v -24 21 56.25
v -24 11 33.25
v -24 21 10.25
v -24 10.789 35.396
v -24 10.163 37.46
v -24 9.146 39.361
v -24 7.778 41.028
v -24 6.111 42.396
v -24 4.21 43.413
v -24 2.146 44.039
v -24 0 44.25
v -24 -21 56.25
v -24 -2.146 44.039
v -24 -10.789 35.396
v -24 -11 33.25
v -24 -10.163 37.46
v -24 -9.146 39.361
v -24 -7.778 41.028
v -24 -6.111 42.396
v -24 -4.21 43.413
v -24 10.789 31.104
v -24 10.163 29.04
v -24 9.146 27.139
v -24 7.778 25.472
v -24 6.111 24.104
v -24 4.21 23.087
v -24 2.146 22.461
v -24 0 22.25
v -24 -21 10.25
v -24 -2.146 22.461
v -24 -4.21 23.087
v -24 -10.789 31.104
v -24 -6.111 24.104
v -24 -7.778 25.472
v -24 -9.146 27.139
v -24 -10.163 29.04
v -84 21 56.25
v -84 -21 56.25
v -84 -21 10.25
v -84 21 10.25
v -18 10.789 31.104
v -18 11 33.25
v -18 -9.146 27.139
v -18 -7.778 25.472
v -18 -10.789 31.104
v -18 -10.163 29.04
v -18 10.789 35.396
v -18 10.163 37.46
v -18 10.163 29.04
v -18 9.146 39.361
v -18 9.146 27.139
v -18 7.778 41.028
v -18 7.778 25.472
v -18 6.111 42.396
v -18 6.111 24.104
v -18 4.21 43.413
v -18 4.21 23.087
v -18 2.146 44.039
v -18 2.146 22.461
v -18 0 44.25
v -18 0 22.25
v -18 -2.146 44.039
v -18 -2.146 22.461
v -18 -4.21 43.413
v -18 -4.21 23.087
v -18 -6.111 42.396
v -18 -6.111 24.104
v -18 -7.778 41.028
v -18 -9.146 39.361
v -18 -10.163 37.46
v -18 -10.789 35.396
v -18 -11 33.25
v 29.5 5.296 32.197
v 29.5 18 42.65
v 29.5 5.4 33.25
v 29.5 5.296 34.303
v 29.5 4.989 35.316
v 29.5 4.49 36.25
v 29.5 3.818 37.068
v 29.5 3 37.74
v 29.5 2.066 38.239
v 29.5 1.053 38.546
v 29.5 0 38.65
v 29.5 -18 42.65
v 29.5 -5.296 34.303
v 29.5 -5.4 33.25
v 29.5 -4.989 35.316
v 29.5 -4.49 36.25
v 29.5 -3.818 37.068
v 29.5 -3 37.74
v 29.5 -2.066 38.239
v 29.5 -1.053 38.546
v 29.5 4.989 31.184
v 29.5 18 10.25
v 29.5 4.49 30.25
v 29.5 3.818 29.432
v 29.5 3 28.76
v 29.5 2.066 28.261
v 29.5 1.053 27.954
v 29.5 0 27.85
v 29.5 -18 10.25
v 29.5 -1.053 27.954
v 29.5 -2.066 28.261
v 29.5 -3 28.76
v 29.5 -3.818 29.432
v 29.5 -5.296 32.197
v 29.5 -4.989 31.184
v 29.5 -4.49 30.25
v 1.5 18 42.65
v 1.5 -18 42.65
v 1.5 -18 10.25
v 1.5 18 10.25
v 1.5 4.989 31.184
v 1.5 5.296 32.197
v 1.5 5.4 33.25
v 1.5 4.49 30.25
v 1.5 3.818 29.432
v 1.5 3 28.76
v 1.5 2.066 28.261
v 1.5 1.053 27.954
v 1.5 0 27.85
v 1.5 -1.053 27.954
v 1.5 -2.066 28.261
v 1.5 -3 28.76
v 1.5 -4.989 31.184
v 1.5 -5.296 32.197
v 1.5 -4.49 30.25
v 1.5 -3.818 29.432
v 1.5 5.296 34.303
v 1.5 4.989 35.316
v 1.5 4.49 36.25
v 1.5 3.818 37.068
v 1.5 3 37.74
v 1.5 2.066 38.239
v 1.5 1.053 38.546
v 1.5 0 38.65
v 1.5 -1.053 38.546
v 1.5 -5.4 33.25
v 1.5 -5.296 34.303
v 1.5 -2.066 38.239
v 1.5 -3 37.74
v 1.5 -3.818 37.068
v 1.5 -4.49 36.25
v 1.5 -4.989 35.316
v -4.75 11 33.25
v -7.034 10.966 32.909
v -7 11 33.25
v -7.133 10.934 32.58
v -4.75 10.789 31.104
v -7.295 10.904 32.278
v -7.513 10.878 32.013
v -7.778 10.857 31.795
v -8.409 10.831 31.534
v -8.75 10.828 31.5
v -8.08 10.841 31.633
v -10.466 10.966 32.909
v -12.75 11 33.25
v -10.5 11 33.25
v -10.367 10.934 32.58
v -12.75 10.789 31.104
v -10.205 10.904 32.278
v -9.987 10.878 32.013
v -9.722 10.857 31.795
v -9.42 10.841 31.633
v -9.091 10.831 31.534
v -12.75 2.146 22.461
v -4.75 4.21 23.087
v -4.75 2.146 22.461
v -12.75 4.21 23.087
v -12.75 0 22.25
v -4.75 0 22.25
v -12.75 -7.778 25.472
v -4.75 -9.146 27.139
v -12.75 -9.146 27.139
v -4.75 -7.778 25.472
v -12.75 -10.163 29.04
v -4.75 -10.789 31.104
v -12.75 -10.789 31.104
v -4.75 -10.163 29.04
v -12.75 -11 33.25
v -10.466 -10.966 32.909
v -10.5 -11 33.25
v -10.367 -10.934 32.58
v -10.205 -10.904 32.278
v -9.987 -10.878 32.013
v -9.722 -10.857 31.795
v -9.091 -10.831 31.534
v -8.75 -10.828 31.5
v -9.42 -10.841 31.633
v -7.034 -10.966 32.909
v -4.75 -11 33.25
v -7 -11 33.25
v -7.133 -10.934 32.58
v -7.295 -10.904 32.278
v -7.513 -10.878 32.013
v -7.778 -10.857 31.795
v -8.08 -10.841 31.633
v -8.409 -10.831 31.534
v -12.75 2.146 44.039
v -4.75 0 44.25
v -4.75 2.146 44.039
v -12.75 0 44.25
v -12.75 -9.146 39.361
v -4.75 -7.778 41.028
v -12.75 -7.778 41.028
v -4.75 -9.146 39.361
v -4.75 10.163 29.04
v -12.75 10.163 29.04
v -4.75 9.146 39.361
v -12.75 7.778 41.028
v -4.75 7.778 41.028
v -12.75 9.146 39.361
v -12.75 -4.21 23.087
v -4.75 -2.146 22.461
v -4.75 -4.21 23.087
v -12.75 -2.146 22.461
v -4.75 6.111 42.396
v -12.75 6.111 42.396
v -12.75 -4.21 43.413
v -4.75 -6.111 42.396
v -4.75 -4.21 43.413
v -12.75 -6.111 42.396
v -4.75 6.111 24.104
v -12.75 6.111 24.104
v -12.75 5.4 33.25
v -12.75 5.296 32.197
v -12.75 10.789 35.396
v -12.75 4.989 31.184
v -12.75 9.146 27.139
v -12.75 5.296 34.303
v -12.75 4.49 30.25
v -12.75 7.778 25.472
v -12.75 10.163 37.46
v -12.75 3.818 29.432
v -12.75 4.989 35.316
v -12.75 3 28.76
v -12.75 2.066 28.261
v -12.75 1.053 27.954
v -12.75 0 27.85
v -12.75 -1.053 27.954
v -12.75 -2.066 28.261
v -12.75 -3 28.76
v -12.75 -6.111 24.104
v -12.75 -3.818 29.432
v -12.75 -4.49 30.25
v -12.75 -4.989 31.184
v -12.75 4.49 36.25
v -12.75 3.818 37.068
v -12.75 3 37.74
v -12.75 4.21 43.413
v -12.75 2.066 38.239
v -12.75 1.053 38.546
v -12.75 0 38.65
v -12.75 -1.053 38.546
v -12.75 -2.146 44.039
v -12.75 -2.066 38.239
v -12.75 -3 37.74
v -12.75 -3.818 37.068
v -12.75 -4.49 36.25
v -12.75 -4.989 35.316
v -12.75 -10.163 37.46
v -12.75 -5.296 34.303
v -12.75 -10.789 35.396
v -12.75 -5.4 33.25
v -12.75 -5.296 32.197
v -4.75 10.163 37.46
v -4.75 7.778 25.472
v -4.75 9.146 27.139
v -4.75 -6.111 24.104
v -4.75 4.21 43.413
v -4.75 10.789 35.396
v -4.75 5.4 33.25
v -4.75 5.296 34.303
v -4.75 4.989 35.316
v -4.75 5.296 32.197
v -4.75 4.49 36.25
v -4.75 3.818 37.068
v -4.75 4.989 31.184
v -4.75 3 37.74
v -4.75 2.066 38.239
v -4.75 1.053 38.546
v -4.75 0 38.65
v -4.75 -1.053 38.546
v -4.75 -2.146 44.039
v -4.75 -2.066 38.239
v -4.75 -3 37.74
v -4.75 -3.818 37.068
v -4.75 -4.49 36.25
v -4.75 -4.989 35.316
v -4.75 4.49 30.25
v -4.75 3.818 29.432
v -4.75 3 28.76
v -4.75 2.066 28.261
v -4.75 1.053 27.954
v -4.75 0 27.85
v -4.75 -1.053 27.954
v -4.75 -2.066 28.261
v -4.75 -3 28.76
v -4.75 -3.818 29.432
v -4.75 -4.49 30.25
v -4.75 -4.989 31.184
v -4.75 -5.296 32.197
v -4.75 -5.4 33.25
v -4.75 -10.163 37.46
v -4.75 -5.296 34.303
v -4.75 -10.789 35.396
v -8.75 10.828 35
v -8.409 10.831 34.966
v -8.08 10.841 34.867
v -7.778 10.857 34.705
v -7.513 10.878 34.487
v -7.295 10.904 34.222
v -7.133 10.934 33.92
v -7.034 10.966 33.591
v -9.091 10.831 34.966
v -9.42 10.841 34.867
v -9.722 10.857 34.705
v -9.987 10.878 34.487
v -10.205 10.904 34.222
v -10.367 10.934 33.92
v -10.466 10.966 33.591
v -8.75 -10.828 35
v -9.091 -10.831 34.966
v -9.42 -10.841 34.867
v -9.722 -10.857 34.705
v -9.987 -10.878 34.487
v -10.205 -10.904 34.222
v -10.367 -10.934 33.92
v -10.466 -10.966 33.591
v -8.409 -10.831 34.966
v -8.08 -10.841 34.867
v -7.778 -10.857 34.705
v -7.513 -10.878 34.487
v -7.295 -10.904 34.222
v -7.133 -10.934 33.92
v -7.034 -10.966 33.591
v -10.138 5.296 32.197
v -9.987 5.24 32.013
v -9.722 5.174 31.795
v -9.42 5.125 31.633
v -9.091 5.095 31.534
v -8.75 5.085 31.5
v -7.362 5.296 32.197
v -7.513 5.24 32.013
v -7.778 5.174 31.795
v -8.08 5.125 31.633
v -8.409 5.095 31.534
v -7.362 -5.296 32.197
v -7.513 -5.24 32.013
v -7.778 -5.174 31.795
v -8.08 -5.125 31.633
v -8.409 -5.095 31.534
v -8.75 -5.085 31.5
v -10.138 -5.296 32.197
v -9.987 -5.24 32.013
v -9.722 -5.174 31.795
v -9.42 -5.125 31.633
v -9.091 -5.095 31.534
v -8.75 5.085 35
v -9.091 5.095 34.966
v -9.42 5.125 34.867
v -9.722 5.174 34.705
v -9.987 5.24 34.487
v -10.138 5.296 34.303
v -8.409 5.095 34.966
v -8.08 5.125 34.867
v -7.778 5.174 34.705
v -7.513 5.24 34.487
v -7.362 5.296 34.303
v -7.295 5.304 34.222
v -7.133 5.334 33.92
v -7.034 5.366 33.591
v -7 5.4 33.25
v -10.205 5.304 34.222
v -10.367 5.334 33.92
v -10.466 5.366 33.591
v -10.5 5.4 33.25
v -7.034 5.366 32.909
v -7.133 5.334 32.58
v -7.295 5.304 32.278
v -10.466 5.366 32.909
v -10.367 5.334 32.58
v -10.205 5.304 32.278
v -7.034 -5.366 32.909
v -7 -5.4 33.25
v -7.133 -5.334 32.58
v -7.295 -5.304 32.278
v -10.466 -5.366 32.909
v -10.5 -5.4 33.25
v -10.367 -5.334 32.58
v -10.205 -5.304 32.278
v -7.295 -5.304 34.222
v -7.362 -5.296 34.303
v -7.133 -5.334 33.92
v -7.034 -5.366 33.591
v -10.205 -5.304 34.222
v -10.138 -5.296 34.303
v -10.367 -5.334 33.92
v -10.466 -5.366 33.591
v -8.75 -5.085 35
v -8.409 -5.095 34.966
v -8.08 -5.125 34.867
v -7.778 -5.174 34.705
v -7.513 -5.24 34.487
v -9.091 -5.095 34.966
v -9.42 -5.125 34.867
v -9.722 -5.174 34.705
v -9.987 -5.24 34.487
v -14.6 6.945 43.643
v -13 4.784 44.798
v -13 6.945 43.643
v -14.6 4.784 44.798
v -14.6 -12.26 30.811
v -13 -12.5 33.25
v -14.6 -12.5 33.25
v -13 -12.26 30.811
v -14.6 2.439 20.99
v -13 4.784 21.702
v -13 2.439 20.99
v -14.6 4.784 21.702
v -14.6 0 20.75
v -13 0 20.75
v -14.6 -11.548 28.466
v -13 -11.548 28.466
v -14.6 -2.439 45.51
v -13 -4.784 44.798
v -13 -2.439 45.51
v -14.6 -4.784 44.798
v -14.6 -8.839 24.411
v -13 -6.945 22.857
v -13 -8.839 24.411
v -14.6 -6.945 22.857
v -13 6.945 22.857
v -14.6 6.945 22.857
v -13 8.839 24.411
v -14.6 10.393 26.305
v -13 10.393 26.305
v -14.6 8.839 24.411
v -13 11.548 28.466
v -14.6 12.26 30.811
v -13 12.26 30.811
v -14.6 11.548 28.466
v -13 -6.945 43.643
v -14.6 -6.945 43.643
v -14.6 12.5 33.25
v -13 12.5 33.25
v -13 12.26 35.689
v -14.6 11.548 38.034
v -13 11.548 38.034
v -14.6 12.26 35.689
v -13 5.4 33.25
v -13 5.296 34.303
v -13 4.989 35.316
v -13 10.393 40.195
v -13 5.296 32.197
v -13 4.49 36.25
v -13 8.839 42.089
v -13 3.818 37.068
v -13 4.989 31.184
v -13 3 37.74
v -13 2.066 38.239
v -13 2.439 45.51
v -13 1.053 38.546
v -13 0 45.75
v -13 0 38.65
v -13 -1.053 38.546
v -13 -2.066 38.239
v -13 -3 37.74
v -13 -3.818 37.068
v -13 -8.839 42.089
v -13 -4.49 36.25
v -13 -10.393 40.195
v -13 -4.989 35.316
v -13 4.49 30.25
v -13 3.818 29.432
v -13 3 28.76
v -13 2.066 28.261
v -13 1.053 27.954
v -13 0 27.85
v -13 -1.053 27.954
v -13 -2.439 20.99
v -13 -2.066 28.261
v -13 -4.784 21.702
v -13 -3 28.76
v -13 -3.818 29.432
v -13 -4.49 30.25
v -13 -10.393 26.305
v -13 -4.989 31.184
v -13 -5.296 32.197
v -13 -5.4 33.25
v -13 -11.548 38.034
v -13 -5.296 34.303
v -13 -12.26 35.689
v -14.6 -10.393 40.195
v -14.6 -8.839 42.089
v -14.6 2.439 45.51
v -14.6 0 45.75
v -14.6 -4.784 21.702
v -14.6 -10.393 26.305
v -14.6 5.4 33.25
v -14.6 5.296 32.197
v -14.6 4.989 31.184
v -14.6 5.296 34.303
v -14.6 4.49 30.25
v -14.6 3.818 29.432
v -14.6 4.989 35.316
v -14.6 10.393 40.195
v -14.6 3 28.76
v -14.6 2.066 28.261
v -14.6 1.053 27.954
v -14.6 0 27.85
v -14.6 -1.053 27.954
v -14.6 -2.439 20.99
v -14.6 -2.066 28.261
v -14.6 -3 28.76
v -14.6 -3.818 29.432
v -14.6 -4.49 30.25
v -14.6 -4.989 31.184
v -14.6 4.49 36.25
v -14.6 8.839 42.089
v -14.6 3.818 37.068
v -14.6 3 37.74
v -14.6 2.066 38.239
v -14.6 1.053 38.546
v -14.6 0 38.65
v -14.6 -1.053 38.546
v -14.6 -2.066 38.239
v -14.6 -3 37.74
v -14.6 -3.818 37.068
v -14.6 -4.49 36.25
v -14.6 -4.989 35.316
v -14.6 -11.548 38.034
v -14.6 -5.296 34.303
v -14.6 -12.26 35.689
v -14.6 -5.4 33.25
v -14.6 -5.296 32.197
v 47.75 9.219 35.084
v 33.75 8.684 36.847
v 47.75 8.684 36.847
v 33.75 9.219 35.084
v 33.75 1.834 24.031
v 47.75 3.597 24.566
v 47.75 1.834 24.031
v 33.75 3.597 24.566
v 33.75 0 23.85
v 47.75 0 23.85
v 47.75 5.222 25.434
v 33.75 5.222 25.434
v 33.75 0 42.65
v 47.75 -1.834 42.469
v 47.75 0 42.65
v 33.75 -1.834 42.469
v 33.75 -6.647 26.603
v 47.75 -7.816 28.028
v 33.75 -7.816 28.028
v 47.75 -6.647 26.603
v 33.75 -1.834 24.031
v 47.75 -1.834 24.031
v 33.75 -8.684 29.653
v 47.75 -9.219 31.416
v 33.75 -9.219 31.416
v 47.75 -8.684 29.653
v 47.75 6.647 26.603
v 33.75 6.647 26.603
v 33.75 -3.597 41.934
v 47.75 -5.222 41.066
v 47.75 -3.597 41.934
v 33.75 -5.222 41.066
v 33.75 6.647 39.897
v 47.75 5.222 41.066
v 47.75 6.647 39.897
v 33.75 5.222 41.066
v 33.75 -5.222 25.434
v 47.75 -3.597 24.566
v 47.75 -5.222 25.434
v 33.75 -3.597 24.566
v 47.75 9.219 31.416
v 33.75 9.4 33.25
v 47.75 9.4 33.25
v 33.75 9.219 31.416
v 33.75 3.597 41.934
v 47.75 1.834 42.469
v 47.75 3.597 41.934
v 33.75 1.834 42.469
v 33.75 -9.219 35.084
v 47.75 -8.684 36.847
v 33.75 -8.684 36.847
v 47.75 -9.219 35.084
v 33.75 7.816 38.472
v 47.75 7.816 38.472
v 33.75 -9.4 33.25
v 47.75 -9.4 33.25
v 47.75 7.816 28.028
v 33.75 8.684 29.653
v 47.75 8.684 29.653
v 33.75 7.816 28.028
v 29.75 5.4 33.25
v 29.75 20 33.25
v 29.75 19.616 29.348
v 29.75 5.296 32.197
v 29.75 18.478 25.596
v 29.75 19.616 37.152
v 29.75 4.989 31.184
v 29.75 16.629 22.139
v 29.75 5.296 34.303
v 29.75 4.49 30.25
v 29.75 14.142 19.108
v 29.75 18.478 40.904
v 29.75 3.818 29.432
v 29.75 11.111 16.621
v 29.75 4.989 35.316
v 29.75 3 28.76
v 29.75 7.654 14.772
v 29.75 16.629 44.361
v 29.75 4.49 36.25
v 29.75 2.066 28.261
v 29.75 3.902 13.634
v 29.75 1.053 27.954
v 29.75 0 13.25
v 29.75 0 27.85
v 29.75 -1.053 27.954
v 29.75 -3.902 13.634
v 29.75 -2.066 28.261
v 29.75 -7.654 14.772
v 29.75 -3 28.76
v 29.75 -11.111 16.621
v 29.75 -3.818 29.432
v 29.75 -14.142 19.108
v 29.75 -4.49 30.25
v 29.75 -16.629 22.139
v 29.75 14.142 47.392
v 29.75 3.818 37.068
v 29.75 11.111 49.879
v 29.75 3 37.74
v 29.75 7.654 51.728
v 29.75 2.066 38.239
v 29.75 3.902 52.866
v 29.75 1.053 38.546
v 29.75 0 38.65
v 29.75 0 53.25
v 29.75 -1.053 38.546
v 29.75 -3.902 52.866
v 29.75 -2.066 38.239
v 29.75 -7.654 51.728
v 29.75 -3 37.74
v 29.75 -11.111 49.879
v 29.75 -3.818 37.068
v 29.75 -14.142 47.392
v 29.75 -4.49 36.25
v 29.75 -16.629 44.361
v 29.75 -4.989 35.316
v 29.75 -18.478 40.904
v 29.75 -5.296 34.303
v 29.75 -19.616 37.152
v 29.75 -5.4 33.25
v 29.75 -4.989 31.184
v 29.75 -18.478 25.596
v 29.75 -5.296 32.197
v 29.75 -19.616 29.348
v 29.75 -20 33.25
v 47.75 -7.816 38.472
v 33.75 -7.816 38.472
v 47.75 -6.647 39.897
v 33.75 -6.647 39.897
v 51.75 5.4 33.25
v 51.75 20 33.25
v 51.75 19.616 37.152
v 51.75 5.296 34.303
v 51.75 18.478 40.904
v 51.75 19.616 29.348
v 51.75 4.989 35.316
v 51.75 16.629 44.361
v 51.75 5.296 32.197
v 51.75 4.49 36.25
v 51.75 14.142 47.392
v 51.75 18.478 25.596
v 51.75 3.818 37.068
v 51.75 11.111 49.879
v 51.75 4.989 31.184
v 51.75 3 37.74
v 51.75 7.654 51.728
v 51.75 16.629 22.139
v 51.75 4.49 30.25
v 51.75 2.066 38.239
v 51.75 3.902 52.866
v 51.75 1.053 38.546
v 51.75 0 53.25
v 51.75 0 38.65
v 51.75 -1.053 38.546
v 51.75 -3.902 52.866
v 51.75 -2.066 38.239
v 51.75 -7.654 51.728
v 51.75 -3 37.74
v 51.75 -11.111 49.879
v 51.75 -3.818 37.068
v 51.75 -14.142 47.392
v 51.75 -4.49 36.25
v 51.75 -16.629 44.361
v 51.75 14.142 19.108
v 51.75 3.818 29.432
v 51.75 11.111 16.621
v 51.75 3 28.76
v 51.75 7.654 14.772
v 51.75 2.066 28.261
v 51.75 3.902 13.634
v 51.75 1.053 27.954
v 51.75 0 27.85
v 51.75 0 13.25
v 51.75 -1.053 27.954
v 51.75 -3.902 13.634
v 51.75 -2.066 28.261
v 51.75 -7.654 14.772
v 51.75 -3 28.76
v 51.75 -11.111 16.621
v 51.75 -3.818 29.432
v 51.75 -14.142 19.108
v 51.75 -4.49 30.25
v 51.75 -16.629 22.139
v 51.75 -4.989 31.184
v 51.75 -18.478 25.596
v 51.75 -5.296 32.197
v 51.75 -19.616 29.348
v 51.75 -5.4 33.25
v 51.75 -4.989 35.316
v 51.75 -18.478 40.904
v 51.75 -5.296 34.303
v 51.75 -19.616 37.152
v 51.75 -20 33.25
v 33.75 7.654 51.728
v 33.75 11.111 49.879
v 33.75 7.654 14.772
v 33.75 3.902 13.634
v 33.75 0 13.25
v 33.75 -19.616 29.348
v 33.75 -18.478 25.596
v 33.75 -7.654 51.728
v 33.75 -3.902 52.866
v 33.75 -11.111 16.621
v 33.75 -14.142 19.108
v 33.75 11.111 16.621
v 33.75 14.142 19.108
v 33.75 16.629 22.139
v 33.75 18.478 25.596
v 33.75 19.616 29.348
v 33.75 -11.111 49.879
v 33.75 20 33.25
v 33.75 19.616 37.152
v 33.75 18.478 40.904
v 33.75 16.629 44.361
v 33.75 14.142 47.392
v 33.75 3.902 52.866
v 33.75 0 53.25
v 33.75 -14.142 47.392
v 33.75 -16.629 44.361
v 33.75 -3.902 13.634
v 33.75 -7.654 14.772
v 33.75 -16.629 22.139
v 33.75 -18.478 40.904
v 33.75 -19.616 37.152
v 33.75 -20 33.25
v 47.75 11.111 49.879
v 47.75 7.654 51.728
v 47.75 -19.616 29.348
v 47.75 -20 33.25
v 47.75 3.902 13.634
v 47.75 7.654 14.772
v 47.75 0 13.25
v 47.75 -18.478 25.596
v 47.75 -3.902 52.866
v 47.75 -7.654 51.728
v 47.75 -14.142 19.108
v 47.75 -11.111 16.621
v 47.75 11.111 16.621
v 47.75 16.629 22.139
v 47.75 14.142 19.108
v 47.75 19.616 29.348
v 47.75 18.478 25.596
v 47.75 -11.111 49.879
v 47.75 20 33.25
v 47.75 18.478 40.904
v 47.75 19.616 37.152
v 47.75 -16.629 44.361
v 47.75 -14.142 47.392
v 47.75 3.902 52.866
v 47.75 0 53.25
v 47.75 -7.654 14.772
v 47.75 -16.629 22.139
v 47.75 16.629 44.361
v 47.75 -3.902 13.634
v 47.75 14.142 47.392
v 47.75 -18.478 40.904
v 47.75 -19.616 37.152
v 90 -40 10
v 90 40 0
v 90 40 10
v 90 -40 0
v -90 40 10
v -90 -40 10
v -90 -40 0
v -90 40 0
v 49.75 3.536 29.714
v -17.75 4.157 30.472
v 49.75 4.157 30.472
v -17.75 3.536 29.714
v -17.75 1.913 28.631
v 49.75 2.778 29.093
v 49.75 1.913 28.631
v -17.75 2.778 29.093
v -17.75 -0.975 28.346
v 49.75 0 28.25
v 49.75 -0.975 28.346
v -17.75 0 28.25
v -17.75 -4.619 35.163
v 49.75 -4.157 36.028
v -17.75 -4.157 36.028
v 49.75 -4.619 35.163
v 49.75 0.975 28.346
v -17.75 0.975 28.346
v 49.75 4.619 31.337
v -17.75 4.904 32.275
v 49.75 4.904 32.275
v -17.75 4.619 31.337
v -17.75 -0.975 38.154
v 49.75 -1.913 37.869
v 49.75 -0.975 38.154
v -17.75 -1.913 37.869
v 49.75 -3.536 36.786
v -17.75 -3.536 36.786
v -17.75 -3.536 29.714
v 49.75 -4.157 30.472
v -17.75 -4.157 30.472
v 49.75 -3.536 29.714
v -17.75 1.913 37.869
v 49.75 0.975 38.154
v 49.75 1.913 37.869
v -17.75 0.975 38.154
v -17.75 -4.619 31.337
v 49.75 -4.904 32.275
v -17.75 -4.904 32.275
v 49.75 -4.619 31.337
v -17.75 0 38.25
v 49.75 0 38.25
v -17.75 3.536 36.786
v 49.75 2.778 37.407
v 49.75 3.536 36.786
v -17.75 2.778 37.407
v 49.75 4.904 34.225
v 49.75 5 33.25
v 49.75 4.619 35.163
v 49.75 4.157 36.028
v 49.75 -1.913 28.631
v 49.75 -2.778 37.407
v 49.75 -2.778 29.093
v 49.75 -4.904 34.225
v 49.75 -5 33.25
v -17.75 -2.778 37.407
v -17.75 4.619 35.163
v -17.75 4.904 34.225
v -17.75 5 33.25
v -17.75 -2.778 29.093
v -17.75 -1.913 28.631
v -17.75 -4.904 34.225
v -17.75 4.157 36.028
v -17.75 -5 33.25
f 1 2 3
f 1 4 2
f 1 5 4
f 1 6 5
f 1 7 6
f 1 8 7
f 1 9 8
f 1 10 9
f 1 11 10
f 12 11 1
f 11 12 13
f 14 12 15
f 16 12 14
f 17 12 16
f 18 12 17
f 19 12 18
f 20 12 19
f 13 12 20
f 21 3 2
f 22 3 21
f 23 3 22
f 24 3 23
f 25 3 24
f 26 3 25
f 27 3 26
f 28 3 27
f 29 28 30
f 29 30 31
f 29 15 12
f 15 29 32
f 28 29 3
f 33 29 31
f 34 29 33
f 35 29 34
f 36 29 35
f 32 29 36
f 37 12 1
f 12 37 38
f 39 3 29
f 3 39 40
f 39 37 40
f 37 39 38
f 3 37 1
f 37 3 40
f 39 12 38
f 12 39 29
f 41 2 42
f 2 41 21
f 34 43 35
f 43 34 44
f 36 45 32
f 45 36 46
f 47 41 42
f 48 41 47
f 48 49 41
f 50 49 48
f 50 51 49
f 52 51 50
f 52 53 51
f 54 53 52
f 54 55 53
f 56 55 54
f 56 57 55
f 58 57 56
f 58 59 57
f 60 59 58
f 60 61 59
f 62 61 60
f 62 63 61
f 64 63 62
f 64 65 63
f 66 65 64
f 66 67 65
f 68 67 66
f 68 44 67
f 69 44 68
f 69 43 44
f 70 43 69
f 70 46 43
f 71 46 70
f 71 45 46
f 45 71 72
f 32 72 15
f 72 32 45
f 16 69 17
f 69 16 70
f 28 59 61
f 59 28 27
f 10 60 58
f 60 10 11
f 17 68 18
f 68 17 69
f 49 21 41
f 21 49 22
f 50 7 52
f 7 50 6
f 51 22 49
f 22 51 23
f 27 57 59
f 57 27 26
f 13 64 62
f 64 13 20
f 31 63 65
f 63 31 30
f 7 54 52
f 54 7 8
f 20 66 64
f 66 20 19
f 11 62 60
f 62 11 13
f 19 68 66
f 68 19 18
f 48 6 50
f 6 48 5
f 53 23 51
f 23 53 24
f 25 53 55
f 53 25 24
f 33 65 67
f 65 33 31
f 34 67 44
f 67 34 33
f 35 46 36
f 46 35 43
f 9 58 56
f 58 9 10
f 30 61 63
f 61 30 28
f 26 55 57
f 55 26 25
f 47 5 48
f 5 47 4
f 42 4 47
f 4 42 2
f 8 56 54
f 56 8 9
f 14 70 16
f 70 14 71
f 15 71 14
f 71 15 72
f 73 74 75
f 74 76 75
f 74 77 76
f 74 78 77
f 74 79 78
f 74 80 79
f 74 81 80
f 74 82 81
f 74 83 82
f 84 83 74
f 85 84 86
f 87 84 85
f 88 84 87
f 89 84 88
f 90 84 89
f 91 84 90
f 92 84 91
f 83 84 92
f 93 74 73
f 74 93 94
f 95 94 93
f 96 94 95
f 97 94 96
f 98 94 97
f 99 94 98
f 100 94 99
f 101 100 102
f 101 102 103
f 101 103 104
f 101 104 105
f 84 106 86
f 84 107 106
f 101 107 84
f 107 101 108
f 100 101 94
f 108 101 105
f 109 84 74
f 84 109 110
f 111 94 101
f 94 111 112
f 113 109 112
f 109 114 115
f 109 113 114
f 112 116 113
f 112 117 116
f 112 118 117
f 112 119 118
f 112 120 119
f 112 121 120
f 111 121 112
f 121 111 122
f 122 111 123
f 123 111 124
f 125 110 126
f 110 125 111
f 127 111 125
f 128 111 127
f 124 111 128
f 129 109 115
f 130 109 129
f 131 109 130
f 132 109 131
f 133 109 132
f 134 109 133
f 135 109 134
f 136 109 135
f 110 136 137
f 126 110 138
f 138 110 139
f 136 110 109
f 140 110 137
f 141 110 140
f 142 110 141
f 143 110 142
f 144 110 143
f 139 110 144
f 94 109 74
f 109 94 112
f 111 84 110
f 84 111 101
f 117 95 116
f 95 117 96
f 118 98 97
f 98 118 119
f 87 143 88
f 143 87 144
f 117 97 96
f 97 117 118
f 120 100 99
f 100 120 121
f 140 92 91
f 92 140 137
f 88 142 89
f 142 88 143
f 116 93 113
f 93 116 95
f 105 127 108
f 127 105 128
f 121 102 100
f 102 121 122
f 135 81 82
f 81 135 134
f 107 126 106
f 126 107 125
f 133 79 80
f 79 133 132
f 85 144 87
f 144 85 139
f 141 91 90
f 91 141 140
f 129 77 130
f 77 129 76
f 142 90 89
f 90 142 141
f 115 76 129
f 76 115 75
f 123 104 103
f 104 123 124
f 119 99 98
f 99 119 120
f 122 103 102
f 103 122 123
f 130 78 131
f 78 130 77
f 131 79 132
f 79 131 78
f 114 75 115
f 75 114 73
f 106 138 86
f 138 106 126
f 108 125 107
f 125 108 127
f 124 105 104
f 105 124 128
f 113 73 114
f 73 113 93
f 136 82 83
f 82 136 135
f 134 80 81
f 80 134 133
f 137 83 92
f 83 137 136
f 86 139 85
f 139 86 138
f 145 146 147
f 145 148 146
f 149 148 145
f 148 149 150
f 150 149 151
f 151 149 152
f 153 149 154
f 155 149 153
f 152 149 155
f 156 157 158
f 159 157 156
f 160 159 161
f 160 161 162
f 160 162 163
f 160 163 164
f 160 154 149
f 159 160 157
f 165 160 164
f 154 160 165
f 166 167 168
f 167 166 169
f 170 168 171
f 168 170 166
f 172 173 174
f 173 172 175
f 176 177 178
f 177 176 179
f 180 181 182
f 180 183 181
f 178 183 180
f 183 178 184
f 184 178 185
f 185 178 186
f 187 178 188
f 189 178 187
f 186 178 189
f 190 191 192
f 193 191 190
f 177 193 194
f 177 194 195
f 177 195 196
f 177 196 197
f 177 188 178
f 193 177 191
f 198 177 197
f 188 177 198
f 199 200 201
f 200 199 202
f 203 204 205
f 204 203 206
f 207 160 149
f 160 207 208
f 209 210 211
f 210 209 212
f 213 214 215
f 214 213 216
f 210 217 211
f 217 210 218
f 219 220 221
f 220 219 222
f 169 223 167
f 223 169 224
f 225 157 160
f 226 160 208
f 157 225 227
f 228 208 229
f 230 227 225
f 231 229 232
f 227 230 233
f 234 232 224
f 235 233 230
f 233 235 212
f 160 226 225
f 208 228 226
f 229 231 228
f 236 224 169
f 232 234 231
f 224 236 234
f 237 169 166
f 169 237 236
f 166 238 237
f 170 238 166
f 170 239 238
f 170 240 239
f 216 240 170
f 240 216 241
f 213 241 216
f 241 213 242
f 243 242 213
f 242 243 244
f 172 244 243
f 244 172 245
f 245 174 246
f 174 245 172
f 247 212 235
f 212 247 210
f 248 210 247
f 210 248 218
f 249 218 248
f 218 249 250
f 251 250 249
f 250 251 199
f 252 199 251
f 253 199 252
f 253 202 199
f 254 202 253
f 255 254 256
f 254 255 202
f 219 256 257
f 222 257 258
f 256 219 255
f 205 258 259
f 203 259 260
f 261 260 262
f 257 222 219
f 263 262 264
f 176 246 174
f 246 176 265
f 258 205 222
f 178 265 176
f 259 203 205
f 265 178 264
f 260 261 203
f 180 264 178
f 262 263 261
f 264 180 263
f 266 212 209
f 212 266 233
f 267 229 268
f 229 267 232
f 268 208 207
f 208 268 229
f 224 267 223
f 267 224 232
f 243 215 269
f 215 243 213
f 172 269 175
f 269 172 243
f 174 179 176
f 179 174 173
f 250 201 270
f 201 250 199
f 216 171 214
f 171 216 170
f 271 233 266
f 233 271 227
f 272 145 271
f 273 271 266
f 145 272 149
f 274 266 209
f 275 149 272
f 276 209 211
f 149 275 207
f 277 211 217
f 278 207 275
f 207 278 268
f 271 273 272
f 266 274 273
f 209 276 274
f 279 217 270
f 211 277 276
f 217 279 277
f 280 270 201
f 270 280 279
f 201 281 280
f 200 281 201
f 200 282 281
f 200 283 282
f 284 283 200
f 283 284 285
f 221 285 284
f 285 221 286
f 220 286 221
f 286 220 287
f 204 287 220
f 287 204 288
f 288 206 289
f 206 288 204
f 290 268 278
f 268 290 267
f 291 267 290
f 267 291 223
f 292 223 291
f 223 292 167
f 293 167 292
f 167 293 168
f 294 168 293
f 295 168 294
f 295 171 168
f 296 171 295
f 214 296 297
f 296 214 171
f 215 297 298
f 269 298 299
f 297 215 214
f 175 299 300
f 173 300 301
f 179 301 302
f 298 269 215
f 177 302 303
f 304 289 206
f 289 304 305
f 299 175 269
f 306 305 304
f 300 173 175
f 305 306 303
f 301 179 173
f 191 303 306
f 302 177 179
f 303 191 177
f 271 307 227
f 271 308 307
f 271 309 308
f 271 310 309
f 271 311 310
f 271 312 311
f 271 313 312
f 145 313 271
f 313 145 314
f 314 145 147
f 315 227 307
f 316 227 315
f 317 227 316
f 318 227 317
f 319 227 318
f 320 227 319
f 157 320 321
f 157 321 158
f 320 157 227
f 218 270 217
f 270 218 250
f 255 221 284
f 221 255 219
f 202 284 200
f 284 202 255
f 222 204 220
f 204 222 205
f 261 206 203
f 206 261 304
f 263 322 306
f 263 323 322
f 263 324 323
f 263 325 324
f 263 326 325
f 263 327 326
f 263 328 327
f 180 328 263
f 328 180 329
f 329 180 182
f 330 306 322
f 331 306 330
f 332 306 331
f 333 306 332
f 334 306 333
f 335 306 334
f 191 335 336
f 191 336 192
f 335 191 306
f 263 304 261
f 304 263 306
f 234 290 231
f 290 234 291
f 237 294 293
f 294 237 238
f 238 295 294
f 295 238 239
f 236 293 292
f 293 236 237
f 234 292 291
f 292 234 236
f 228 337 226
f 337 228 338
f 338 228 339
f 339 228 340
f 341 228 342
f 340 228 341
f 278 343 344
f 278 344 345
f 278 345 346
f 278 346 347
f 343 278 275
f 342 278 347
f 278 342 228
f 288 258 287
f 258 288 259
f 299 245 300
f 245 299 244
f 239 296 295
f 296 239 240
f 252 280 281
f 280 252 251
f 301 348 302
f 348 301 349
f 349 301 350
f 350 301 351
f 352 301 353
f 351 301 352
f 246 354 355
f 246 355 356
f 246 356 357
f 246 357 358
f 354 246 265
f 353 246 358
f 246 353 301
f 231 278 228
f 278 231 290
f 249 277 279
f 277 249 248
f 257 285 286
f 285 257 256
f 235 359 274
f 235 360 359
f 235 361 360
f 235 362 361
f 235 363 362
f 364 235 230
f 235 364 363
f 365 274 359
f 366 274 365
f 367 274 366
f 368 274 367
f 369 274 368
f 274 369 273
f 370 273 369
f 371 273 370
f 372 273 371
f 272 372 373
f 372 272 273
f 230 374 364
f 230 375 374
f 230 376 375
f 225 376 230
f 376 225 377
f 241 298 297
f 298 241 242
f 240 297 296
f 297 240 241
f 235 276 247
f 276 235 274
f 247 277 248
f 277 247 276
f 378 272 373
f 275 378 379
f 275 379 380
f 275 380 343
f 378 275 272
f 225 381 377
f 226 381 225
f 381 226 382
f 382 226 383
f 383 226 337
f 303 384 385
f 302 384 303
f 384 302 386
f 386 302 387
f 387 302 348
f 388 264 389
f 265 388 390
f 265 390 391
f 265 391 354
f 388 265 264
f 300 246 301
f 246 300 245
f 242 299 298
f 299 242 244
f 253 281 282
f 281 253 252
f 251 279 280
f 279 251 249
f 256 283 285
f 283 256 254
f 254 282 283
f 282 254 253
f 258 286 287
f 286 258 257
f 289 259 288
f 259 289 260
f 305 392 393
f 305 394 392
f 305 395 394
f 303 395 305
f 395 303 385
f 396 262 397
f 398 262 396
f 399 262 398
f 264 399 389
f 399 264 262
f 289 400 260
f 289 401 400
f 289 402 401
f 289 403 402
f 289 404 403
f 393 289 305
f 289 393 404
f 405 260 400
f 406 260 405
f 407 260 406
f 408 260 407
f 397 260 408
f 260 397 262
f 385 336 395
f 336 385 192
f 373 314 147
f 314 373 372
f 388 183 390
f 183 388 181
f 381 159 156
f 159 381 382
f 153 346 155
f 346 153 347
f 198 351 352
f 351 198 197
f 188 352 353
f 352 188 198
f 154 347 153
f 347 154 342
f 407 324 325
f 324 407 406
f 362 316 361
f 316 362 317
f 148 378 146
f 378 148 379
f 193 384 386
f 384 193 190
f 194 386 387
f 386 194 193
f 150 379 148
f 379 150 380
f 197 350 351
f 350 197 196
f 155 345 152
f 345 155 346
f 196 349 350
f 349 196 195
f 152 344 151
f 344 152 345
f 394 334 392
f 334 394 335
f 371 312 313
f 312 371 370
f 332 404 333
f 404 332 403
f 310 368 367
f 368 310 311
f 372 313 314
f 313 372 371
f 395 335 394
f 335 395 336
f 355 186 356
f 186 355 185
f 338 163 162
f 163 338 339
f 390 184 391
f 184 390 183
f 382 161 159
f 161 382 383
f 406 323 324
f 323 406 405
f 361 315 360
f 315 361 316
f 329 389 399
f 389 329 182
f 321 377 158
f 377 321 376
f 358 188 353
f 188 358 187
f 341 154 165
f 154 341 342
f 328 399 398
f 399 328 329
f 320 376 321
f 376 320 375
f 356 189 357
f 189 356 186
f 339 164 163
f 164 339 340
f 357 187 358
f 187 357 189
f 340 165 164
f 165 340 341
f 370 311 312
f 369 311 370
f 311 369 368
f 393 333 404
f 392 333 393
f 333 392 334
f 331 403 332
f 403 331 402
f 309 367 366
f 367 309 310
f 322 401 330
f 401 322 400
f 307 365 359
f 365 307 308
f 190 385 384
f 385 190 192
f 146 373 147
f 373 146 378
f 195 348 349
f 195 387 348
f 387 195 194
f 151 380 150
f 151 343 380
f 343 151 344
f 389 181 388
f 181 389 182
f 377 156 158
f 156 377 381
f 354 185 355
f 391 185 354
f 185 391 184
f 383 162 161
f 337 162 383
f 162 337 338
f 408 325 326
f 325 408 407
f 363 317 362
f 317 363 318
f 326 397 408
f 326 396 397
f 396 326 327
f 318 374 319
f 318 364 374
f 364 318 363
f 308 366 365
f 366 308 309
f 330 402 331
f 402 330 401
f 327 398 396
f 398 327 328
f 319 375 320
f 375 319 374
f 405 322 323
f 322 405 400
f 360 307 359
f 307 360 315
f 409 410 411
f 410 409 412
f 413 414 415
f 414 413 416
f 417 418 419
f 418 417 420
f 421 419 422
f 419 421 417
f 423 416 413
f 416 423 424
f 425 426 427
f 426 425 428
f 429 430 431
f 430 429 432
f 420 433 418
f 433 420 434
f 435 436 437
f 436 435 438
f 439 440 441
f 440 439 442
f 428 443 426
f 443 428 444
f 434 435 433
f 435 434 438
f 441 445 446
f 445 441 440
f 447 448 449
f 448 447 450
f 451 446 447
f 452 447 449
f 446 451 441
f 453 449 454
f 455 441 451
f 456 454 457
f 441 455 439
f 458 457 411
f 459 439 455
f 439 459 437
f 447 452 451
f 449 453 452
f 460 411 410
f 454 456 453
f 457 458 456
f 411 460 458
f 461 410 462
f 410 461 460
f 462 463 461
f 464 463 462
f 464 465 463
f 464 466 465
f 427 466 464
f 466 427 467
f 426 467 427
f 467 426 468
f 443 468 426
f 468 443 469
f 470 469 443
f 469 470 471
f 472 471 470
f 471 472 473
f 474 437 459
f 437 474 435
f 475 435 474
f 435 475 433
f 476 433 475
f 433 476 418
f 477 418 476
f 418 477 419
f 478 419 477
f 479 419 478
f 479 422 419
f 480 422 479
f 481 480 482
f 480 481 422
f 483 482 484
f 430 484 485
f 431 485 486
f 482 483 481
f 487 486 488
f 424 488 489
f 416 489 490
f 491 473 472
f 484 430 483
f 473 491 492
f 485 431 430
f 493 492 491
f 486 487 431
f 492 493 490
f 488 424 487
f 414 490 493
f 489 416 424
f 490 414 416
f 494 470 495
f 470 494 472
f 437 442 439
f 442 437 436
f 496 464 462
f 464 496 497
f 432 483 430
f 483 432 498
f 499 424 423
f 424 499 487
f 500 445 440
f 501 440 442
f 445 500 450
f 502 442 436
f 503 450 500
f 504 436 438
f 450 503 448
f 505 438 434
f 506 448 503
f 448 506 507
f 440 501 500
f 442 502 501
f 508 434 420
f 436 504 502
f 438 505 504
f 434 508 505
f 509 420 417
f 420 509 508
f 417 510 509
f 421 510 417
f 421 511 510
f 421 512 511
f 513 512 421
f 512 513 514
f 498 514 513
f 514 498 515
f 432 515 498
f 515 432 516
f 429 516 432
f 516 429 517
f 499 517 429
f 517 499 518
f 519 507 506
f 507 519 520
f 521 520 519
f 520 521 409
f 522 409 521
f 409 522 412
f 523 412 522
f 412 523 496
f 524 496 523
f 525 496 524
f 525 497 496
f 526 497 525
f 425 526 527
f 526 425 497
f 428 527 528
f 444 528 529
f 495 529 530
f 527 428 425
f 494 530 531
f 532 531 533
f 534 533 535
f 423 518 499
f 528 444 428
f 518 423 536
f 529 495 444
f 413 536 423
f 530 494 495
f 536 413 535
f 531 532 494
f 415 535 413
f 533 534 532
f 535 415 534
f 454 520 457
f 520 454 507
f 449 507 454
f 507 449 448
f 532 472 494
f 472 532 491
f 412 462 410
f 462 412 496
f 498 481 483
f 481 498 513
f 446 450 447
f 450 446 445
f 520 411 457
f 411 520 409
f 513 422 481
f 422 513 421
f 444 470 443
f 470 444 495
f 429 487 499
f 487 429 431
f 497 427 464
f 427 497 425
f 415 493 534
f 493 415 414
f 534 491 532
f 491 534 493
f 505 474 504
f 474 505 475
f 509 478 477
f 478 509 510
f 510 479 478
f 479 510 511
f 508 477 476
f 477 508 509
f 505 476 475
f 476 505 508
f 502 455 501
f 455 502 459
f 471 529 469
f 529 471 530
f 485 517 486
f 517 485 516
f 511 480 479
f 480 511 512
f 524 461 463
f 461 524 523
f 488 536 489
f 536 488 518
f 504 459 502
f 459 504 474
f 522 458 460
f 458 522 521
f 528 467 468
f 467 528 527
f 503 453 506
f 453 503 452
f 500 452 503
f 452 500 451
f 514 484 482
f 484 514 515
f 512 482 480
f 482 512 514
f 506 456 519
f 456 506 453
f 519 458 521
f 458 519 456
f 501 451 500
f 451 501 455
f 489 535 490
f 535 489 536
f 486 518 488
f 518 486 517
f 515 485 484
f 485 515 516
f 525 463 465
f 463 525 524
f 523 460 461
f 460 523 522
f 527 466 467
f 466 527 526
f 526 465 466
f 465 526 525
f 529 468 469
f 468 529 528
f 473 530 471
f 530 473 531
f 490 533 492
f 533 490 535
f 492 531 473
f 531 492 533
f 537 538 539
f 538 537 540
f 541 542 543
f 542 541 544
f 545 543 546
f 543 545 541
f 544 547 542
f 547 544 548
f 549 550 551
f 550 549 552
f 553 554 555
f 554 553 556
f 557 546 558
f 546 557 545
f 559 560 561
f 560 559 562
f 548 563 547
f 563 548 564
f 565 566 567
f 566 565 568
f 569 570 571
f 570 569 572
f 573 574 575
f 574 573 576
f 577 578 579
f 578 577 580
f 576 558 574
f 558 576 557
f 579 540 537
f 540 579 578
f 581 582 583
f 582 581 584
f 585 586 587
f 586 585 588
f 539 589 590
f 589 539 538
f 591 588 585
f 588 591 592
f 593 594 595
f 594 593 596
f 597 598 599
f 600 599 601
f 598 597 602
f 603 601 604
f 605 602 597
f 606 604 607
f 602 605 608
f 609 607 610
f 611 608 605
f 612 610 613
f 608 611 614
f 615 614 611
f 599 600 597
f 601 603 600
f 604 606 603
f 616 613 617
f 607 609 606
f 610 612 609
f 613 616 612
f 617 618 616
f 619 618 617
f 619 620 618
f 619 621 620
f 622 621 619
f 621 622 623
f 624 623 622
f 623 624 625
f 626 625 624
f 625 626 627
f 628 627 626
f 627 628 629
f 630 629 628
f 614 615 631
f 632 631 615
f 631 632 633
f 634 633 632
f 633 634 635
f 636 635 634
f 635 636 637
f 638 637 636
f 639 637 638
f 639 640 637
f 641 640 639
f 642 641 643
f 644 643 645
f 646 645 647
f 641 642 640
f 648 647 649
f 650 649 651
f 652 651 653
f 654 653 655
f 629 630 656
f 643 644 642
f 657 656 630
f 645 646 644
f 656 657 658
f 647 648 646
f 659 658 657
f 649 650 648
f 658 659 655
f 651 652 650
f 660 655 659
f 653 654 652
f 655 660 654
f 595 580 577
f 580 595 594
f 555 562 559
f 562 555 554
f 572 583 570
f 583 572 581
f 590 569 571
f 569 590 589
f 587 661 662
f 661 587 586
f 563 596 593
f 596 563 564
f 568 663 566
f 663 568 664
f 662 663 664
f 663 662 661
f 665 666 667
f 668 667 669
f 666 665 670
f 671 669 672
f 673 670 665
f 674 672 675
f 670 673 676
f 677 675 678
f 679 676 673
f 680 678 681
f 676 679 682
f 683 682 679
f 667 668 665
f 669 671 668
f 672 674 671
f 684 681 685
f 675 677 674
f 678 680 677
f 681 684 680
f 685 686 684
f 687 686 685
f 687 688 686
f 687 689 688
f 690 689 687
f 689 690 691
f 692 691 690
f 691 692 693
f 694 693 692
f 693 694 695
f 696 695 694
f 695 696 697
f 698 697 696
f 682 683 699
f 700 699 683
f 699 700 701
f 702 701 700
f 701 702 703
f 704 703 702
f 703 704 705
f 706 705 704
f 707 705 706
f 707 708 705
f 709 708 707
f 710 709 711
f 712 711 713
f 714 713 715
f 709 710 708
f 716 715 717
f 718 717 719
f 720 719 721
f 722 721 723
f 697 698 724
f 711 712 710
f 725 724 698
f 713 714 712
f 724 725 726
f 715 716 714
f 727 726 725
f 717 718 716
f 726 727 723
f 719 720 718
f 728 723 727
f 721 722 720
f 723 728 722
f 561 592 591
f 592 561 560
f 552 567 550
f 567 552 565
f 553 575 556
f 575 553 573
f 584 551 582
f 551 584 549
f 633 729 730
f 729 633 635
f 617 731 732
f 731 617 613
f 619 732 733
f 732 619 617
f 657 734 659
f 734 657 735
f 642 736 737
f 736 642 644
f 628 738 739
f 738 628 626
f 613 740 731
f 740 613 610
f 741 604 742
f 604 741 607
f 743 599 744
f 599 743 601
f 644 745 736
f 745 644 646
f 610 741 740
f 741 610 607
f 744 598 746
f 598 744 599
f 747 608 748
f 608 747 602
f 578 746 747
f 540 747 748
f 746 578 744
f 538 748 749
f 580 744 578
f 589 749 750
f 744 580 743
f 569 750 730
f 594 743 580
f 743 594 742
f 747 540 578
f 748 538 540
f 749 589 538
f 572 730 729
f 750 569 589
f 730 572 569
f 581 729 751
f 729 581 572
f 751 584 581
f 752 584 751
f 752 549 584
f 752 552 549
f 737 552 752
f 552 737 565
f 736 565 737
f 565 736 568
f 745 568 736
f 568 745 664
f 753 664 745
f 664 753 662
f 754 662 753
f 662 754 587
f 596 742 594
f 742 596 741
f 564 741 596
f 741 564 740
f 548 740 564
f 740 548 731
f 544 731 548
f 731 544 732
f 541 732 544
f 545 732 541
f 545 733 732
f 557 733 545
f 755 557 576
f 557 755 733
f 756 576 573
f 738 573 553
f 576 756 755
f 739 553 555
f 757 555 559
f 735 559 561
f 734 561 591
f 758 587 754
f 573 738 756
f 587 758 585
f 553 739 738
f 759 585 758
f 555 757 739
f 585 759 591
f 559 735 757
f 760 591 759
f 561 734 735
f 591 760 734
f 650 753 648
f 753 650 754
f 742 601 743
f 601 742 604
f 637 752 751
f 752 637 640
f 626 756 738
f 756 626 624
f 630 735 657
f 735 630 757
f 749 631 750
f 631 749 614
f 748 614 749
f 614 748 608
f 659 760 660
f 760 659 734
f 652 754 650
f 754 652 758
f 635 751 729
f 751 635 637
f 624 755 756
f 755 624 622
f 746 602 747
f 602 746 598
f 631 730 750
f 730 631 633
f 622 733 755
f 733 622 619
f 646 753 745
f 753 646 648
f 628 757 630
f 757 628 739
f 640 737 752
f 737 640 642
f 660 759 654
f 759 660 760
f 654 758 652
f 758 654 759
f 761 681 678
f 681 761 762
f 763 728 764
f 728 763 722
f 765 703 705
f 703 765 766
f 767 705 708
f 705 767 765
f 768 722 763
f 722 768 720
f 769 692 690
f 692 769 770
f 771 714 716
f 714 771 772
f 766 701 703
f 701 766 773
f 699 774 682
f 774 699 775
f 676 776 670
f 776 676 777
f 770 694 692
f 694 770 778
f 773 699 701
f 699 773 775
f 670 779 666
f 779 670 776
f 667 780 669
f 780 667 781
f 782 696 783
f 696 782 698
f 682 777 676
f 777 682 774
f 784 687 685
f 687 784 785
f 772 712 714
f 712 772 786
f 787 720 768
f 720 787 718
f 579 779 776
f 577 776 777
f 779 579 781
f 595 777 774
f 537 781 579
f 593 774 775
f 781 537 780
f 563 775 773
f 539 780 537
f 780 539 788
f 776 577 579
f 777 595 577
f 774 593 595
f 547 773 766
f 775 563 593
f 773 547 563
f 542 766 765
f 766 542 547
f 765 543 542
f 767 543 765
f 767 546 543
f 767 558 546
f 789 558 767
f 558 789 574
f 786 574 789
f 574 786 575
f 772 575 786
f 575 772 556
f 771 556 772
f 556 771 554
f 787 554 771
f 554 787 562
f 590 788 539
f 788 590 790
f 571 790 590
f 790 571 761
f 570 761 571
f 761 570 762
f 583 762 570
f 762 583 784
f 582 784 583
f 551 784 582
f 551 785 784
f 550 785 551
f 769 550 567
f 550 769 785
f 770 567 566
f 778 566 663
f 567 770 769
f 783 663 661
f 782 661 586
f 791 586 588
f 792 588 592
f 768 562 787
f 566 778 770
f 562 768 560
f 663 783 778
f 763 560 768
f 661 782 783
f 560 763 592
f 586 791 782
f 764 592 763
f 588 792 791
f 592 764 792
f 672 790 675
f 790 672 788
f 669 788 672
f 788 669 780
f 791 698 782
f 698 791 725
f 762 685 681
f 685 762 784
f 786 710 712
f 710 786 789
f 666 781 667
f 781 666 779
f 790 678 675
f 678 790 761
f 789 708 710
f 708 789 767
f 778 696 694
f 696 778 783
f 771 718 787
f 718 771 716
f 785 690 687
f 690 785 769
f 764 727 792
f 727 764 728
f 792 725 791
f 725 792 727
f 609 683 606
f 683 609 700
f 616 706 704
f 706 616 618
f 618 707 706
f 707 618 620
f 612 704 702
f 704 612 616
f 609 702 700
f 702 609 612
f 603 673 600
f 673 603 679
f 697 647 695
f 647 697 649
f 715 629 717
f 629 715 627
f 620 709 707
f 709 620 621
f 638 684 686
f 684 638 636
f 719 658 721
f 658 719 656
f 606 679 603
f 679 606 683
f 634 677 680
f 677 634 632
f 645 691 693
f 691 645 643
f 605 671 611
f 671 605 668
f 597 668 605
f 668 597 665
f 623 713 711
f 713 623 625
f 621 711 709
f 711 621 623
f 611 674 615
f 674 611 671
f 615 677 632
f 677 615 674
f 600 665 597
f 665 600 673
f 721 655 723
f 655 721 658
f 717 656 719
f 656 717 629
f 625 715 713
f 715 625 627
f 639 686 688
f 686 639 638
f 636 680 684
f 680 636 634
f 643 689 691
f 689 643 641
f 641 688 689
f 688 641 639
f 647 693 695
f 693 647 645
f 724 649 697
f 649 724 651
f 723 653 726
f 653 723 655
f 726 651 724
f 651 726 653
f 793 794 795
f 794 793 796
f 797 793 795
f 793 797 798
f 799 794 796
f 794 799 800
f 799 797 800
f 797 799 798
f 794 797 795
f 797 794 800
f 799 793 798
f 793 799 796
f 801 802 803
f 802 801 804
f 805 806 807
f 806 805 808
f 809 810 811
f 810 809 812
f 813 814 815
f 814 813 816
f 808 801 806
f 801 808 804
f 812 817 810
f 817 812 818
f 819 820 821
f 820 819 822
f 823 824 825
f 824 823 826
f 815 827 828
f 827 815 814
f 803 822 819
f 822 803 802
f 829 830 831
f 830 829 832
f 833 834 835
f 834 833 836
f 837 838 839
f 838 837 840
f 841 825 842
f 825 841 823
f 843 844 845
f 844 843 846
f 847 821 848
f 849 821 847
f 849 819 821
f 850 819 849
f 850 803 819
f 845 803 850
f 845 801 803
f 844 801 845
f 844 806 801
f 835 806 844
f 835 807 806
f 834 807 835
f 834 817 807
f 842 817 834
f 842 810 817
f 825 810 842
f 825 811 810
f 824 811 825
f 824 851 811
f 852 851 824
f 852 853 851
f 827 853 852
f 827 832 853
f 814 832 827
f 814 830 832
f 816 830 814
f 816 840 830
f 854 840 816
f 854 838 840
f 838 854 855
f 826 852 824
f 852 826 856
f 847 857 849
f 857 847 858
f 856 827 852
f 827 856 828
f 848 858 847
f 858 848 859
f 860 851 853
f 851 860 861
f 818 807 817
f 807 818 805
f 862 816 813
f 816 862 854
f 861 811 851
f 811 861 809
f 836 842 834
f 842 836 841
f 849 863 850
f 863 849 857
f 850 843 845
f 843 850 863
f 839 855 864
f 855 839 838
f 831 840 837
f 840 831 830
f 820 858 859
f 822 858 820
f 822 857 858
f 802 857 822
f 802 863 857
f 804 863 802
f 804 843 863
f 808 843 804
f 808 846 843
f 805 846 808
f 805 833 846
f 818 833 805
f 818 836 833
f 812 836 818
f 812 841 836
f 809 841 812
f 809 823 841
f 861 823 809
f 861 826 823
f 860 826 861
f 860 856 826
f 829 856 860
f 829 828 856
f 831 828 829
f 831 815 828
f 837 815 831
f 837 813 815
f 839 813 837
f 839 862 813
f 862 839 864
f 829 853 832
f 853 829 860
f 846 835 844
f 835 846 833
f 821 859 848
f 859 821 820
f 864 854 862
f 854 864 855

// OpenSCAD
$fn = 32;

// ------------------------------------------------------------------------
// Motor drive station: motor 60 x 46 mm, shaft d10, pulley d40
// Every part is its own module, assembly() places every instance.
// ------------------------------------------------------------------------

// --- part 1 ---
module station_bed() {
  difference() {
    translate([-90, -40, 0]) cube([180, 80, 10]);
  }
}

// --- part 2 ---
module drive_motor() {
  union() {
    translate([-30, -21, 0]) cube([60, 42, 46]);
    translate([33, 0, 23]) rotate([0, 90, 0]) cylinder(h = 6, d = 22, center = true);
  }
}

// --- part 3 ---
module pillow_block() {
  difference() {
    translate([-14, -18, 0]) cube([28, 36, 32.4]);
    translate([0, 0, 23]) rotate([0, 90, 0]) cylinder(h = 30, d = 10.8, center = true);
  }
}

// --- part 4 ---
module drive_shaft() {
  translate([0, 0, -33.75]) cylinder(h = 67.5, d = 10);
}

// --- part 5 ---
module shaft_collar() {
  difference() {
    cylinder(h = 8, d = 22);
    translate([0, 0, -1]) cylinder(h = 10, d = 10.8);
    translate([0, 0, 4]) rotate([90, 0, 0]) cylinder(h = 24, d = 3.5, center = true);
  }
}

// --- part 6 ---
module collar_washer() {
  difference() {
      translate([0, 0, 0]) cylinder(h = 1.6, d = 25);
      translate([0, 0, -1]) cylinder(h = 3.6, d = 10.8);
    }
}

// --- part 7 ---
module drive_pulley() {
  difference() {
    union() {
      cylinder(h = 22, d = 18.8);
      cylinder(h = 4, d = 40);
      translate([0, 0, 18]) cylinder(h = 4, d = 40);
    }
    translate([0, 0, -1]) cylinder(h = 24, d = 10.8);
  }
}

// --- assembly ---
module assembly() {
  color([0.80, 0.24, 0.20]) translate([0, 0, 0]) rotate([0, 0, 0]) station_bed();
  color([0.20, 0.45, 0.75]) translate([-54, 0, 10.25]) rotate([0, 0, 0]) drive_motor();
  color([0.25, 0.62, 0.32]) translate([15.5, 0, 10.25]) rotate([0, 0, 0]) pillow_block();
  color([0.92, 0.70, 0.18]) translate([16, 0, 33.25]) rotate([0, 90, 0]) drive_shaft();
  color([0.58, 0.35, 0.70]) translate([-12.75, 0, 33.25]) rotate([0, 90, 0]) shaft_collar();
  color([0.16, 0.66, 0.66]) translate([-14.6, 0, 33.25]) rotate([0, 90, 0]) collar_washer();
  color([0.85, 0.48, 0.18]) translate([29.75, 0, 33.25]) rotate([0, 90, 0]) drive_pulley();
}

assembly();
